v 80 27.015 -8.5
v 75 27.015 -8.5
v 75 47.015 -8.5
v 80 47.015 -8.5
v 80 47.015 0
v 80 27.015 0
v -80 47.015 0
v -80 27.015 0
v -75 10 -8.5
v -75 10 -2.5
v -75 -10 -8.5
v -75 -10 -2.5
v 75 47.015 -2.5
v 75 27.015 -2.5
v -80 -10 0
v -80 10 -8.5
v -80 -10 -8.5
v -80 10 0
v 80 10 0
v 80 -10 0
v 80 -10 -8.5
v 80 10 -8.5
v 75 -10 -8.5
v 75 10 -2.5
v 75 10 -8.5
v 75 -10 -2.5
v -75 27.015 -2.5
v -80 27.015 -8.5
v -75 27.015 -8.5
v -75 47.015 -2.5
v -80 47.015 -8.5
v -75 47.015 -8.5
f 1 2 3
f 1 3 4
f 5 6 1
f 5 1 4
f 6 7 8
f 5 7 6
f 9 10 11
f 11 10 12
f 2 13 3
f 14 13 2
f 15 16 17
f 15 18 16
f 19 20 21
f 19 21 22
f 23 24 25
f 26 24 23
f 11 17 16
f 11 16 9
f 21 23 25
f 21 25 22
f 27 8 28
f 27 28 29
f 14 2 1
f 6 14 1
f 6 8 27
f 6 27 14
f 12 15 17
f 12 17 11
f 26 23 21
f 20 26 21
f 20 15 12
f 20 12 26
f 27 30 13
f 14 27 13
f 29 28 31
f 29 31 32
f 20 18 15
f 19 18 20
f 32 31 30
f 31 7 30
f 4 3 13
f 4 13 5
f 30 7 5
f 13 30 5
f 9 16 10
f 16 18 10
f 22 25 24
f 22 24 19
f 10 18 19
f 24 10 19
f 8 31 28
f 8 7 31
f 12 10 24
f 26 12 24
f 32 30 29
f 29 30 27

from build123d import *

# Parameters (mm, degrees)
F0_W     = 160
F0_H     = 20
F1_DEPTH = 2.5
F2_W     = 5
F2_H     = 20
F3_DEPTH = 6
F4_W     = 160
F4_H     = 20
F5_DEPTH = 2.5
F6_W     = 5
F6_H     = 20
F7_DEPTH = 6


with BuildPart() as f1:
    # F0 (on Top) → F1 (new body)
    with BuildSketch(Plane.XY):
        Rectangle(F0_W, F0_H)
    extrude(amount=-F1_DEPTH)

    # F2 (on face) → F3 (join)
    with BuildSketch(Plane(origin=(0, 0, -2.5), x_dir=(1, 0, 0), z_dir=(0, 0, -1))):
        with Locations((-77.5, 0)):
            Rectangle(F2_W, F2_H)
        with Locations((77.5, 0)):
            Rectangle(F2_W, F2_H)
    extrude(amount=F3_DEPTH)


with BuildPart() as f5:
    # F4 (on Top) → F5 (new body)
    with BuildSketch(Plane.XY):
        with Locations((0, 37.014924)):
            Rectangle(F4_W, F4_H)
    extrude(amount=-F5_DEPTH)

    # F6 (on face) → F7 (join)
    with BuildSketch(Plane(origin=(0, 0, -2.5), x_dir=(1, 0, 0), z_dir=(0, 0, -1))):
        with Locations((-77.5, -37.014924)):
            Rectangle(F6_W, F6_H)
        with Locations((77.5, -37.014924)):
            Rectangle(F6_W, F6_H)
    extrude(amount=F7_DEPTH)


solid = Compound([f1.part, f5.part])
